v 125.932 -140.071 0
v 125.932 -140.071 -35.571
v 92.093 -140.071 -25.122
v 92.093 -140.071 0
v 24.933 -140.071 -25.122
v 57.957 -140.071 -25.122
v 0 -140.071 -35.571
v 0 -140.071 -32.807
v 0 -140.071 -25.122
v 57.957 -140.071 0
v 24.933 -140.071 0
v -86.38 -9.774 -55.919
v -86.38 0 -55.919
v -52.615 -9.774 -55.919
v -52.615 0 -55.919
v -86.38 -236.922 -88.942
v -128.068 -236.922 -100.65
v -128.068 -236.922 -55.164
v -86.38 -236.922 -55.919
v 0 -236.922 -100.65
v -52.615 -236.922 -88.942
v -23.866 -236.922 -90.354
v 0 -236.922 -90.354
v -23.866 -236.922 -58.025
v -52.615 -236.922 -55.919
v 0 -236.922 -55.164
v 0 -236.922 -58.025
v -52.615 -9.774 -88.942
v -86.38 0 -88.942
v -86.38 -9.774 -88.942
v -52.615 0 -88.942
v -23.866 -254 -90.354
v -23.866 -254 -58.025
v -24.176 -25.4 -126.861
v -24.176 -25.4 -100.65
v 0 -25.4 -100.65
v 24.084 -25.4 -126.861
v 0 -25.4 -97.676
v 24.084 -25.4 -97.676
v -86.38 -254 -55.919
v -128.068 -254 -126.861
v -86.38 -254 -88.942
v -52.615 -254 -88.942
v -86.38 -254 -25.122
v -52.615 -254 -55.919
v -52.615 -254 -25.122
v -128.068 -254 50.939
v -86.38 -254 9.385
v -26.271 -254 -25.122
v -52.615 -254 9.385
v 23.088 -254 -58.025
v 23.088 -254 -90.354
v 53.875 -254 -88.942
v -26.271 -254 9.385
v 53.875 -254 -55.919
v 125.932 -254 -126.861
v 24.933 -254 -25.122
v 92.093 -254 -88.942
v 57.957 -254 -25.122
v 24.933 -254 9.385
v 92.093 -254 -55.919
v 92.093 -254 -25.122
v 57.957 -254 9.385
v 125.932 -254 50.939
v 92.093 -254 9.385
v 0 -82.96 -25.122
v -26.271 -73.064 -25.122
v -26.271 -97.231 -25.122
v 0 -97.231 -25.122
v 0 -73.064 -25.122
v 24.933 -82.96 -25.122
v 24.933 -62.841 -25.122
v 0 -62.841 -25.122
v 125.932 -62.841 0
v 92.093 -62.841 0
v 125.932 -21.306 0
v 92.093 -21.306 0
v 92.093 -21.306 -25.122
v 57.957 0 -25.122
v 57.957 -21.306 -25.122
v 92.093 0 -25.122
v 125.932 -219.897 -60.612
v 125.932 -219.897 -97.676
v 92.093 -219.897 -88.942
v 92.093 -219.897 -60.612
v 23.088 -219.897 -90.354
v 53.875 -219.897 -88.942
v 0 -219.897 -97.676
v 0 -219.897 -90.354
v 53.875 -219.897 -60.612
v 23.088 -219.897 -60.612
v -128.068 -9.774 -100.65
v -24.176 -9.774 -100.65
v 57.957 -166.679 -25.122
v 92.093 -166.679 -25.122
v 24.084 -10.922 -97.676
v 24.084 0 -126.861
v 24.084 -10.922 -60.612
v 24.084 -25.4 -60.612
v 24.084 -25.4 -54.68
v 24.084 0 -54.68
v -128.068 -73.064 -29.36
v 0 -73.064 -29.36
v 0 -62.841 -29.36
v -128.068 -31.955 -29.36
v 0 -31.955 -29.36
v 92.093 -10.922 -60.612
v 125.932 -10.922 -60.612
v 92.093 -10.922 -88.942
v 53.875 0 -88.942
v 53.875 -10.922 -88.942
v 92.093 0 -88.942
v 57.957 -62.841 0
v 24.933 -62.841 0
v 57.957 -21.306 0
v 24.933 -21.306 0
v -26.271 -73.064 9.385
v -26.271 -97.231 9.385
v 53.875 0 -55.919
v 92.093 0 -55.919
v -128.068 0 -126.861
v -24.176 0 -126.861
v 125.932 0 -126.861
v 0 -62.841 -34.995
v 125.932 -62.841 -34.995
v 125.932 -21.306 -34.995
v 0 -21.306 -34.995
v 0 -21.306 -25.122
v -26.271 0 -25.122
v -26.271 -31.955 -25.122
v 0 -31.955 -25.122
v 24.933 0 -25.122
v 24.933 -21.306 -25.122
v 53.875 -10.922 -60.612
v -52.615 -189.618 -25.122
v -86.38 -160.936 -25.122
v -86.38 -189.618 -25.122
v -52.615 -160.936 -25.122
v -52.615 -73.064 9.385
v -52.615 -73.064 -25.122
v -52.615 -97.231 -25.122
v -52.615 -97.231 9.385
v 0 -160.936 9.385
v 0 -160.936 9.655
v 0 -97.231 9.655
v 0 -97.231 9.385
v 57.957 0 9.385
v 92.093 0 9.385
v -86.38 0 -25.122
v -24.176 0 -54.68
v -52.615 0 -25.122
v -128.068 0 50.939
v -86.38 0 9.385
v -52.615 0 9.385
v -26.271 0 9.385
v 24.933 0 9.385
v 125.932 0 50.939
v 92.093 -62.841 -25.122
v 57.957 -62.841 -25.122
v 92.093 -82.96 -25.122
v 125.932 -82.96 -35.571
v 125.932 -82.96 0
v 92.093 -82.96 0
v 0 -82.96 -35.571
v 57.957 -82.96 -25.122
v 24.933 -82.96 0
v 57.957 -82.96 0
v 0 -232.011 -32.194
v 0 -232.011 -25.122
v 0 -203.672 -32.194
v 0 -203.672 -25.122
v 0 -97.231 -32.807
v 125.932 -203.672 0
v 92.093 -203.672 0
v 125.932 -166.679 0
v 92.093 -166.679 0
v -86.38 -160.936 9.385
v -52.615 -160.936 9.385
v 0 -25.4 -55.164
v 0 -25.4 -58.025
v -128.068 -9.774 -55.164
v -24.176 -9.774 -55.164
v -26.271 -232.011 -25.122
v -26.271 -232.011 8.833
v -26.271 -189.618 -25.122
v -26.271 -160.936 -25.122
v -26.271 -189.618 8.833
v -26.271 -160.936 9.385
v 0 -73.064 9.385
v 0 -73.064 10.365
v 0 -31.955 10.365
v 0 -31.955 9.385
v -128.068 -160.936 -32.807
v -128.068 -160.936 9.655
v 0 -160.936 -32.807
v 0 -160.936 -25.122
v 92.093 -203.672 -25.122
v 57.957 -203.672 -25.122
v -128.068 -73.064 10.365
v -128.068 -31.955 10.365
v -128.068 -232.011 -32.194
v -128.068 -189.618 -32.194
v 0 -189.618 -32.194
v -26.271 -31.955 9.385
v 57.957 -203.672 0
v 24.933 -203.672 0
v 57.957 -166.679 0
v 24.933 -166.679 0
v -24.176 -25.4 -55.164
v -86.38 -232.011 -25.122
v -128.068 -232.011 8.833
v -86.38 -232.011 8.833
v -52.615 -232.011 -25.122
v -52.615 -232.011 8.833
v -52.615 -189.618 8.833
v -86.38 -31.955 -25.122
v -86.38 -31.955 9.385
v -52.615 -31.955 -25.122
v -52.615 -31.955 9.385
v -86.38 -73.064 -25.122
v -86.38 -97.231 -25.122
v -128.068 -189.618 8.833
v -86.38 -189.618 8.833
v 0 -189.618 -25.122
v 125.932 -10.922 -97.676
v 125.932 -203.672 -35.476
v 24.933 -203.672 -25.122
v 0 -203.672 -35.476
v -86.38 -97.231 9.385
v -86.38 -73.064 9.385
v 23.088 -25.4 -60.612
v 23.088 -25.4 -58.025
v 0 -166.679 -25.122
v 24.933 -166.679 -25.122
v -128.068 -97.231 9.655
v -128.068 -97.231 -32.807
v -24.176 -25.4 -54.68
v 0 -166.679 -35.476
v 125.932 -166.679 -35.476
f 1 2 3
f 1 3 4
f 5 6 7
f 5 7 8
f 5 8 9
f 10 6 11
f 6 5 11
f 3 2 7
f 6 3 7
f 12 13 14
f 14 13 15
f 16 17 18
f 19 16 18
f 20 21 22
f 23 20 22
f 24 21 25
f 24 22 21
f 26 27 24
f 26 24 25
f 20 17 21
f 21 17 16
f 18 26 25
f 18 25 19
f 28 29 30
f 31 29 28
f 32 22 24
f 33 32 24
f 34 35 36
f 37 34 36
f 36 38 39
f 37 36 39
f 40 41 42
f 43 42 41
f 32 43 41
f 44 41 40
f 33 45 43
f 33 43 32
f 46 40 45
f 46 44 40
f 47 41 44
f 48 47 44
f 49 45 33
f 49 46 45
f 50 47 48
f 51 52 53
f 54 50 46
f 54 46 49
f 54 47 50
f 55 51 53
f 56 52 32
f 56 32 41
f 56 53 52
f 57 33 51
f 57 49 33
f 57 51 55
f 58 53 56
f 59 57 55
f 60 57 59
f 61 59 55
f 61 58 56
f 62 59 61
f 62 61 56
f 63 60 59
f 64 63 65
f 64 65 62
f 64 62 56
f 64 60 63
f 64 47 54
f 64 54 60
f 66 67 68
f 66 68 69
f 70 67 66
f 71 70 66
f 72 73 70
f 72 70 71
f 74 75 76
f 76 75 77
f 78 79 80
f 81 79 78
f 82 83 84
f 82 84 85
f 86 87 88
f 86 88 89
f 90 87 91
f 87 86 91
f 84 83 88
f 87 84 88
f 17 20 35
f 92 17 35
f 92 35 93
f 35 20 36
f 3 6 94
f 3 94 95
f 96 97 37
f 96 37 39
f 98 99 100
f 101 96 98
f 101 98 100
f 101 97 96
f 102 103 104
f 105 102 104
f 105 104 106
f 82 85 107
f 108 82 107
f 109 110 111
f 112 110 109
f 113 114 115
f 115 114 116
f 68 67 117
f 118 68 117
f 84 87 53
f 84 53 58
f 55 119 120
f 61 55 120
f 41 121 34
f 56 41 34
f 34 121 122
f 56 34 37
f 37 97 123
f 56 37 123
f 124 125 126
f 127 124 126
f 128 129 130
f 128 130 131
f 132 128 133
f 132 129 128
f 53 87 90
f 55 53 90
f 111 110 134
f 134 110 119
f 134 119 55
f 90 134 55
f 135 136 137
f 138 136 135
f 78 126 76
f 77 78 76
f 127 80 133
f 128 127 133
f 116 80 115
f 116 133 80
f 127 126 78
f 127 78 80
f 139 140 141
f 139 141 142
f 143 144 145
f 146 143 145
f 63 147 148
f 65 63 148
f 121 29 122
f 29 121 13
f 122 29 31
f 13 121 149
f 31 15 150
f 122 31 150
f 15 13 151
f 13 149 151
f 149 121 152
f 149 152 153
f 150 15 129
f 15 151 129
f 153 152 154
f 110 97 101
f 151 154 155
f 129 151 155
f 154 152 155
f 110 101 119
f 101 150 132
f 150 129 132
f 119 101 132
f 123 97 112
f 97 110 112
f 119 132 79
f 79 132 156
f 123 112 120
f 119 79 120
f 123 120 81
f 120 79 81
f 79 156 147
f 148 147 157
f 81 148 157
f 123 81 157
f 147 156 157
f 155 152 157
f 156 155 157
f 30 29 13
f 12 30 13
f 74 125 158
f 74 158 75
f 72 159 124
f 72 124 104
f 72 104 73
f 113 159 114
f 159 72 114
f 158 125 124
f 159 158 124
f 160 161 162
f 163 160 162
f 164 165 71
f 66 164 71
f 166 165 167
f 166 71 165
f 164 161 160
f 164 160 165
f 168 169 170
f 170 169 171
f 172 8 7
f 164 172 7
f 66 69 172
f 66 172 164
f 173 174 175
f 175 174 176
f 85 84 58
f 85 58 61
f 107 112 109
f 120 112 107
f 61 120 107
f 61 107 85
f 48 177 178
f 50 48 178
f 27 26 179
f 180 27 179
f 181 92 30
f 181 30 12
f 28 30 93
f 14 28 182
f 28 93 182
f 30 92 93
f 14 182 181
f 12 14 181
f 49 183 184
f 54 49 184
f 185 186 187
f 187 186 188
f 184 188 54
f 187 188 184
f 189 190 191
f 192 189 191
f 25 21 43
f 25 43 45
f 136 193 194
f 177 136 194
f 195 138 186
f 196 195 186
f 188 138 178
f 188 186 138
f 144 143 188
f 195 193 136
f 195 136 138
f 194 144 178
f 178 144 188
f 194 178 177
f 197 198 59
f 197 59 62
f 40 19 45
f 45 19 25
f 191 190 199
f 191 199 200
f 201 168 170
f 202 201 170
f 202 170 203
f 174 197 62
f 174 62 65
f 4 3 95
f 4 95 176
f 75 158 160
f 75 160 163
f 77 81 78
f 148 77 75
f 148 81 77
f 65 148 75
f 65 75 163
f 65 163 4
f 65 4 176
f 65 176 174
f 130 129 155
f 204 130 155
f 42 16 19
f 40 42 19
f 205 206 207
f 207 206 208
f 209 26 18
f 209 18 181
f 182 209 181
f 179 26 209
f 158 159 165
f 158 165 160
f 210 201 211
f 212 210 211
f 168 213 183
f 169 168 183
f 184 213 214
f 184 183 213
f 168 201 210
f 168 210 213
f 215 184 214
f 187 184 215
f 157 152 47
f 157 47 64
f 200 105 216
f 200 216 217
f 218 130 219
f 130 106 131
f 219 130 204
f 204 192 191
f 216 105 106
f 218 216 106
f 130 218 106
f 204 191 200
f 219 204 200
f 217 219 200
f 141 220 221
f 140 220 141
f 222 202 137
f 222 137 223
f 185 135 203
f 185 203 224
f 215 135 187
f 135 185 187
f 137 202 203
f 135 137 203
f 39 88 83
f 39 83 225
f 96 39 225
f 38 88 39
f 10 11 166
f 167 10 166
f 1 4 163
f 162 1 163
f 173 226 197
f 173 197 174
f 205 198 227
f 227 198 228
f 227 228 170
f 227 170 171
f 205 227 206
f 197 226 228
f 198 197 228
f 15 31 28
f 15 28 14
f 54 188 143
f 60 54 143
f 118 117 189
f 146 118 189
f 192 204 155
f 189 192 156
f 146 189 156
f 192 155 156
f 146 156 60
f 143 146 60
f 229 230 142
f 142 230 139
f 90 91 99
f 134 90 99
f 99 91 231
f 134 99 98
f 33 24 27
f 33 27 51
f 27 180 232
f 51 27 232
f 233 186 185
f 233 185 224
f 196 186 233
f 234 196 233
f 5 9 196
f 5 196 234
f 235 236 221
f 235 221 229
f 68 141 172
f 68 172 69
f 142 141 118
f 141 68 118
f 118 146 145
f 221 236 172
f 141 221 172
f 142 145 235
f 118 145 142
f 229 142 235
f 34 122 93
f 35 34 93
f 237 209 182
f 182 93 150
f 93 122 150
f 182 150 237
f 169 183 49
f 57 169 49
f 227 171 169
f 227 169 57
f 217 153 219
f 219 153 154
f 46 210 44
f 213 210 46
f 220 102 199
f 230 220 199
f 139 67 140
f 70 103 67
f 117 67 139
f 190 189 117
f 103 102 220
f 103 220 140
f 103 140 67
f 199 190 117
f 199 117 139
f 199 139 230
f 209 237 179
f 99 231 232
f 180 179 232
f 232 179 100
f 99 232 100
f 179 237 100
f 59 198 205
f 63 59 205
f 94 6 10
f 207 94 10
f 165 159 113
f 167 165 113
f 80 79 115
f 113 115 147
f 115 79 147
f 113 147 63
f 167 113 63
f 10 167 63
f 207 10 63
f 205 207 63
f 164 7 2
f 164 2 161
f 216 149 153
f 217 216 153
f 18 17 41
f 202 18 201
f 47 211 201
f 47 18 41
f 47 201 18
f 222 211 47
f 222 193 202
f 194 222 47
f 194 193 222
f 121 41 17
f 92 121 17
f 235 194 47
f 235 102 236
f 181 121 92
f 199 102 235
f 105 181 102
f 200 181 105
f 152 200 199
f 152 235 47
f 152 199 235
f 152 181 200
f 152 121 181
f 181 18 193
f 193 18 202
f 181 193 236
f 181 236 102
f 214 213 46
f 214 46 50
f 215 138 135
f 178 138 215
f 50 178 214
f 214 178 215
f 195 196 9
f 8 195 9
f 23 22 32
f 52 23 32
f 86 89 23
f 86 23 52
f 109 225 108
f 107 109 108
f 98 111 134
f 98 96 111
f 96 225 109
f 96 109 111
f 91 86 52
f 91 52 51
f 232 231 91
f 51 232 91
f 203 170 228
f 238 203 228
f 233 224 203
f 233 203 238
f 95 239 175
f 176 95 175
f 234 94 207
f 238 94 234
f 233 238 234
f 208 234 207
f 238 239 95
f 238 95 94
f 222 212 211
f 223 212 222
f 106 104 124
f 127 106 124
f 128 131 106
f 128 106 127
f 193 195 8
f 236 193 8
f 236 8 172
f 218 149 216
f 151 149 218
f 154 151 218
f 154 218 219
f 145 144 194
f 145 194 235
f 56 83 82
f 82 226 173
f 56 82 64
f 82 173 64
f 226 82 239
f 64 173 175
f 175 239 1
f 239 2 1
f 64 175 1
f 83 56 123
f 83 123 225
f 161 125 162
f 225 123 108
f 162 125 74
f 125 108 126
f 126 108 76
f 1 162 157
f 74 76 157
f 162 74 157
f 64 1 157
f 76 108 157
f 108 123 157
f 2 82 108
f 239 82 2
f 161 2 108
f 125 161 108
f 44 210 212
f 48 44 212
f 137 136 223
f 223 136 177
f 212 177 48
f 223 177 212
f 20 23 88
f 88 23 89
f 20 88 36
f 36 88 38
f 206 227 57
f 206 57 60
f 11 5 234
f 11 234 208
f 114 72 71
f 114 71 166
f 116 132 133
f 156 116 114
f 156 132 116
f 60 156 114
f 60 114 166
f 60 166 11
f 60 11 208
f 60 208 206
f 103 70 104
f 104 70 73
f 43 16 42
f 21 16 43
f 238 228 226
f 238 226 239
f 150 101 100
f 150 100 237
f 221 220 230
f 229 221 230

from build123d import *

# Parameters (mm, degrees)
F0_W      = 254
F0_H      = 177.8
F1_DEPTH  = 254
F2_W      = 24.176218
F2_H      = 76.2
F2_W_2    = 24.083782
F3_DEPTH  = 25.4
F4_W      = 33.765226
F4_H      = 33.023134
F4_W_2    = 38.217779
F4_W_3    = 34.136269
F4_H_2    = 34.507318
F4_W_4    = 51.204408
F5_DEPTH  = 254
F6_W      = 46.953924
F6_H      = 32.328948
F7_DEPTH  = 508
F8_W      = 227.147804
F8_H      = 45.486924
F8_W_2    = 42.393267
F8_H_2    = 41.027097
F8_W_3    = 63.705511
F8_H_3    = 42.462038
F8_W_4    = 41.108959
F8_H_4    = 39.725055
F9_DEPTH  = 254
F10_W     = 208.975072
F10_H     = 37.064538
F10_W_2   = 36.99249
F10_H_2   = 35.475526
F10_W_3   = 57.111204
F10_H_3   = 35.570968
F10_W_4   = 41.535424
F10_H_4   = 34.99518
F11_DEPTH = 127


with BuildPart() as f1:
    # F0 (on Front) → F1 (new body)
    with BuildSketch(Plane.XZ):
        with Locations((-1.067655, -37.961216)):
            Rectangle(F0_W, F0_H)
    extrude(amount=F1_DEPTH)

    # F2 (on Front) → F3 (cut)
    with BuildSketch(Plane.XZ):
        with Locations((-12.088109, -92.779977)):
            Rectangle(F2_W, F2_H)
        with Locations((12.041891, -92.779977)):
            Rectangle(F2_W_2, F2_H)
    extrude(amount=F3_DEPTH, mode=Mode.SUBTRACT)

    # F4 (on Front) → F5 (cut)
    with BuildSketch(Plane.XZ):
        with Locations((-69.497861, -72.430827)):
            Rectangle(F4_W, F4_H)
        with Locations((72.983959, -72.430827)):
            Rectangle(F4_W_2, F4_H)
        with Locations((75.024715, -7.868753)):
            Rectangle(F4_W_3, F4_H_2)
        with Locations((-69.497861, -7.868753)):
            Rectangle(F4_W, F4_H_2)
        with Locations((-0.668756, -7.868753)):
            Rectangle(F4_W_4, F4_H_2)
    extrude(amount=F5_DEPTH, mode=Mode.SUBTRACT)

    # F6 (on Front) → F7 (cut)
    with BuildSketch(Plane.XZ):
        with Locations((-0.388555, -74.189298)):
            Rectangle(F6_W, F6_H)
    extrude(amount=F7_DEPTH, mode=Mode.SUBTRACT)

    # F8 (on Right) → F9 (cut)
    with BuildSketch(Plane.YZ):
        with Locations((-123.347826, -77.906983)):
            Rectangle(F8_W, F8_H)
        with Locations((-210.81461, -11.680585)):
            Rectangle(F8_W_2, F8_H_2)
        with Locations((-129.083659, -11.576193)):
            Rectangle(F8_W_3, F8_H_3)
        with Locations((-52.509461, -9.497304)):
            Rectangle(F8_W_4, F8_H_4)
    extrude(amount=-F9_DEPTH, mode=Mode.SUBTRACT)

    # F10 (on Right) → F11 (cut)
    with BuildSketch(Plane.YZ):
        with Locations((-115.409213, -79.144068)):
            Rectangle(F10_W, F10_H)
        with Locations((-185.175732, -17.737763)):
            Rectangle(F10_W_2, F10_H_2)
        with Locations((-111.515269, -17.785484)):
            Rectangle(F10_W_3, F10_H_3)
        with Locations((-42.073241, -17.49759)):
            Rectangle(F10_W_4, F10_H_4)
    extrude(amount=F11_DEPTH, mode=Mode.SUBTRACT)


solid = f1.part
